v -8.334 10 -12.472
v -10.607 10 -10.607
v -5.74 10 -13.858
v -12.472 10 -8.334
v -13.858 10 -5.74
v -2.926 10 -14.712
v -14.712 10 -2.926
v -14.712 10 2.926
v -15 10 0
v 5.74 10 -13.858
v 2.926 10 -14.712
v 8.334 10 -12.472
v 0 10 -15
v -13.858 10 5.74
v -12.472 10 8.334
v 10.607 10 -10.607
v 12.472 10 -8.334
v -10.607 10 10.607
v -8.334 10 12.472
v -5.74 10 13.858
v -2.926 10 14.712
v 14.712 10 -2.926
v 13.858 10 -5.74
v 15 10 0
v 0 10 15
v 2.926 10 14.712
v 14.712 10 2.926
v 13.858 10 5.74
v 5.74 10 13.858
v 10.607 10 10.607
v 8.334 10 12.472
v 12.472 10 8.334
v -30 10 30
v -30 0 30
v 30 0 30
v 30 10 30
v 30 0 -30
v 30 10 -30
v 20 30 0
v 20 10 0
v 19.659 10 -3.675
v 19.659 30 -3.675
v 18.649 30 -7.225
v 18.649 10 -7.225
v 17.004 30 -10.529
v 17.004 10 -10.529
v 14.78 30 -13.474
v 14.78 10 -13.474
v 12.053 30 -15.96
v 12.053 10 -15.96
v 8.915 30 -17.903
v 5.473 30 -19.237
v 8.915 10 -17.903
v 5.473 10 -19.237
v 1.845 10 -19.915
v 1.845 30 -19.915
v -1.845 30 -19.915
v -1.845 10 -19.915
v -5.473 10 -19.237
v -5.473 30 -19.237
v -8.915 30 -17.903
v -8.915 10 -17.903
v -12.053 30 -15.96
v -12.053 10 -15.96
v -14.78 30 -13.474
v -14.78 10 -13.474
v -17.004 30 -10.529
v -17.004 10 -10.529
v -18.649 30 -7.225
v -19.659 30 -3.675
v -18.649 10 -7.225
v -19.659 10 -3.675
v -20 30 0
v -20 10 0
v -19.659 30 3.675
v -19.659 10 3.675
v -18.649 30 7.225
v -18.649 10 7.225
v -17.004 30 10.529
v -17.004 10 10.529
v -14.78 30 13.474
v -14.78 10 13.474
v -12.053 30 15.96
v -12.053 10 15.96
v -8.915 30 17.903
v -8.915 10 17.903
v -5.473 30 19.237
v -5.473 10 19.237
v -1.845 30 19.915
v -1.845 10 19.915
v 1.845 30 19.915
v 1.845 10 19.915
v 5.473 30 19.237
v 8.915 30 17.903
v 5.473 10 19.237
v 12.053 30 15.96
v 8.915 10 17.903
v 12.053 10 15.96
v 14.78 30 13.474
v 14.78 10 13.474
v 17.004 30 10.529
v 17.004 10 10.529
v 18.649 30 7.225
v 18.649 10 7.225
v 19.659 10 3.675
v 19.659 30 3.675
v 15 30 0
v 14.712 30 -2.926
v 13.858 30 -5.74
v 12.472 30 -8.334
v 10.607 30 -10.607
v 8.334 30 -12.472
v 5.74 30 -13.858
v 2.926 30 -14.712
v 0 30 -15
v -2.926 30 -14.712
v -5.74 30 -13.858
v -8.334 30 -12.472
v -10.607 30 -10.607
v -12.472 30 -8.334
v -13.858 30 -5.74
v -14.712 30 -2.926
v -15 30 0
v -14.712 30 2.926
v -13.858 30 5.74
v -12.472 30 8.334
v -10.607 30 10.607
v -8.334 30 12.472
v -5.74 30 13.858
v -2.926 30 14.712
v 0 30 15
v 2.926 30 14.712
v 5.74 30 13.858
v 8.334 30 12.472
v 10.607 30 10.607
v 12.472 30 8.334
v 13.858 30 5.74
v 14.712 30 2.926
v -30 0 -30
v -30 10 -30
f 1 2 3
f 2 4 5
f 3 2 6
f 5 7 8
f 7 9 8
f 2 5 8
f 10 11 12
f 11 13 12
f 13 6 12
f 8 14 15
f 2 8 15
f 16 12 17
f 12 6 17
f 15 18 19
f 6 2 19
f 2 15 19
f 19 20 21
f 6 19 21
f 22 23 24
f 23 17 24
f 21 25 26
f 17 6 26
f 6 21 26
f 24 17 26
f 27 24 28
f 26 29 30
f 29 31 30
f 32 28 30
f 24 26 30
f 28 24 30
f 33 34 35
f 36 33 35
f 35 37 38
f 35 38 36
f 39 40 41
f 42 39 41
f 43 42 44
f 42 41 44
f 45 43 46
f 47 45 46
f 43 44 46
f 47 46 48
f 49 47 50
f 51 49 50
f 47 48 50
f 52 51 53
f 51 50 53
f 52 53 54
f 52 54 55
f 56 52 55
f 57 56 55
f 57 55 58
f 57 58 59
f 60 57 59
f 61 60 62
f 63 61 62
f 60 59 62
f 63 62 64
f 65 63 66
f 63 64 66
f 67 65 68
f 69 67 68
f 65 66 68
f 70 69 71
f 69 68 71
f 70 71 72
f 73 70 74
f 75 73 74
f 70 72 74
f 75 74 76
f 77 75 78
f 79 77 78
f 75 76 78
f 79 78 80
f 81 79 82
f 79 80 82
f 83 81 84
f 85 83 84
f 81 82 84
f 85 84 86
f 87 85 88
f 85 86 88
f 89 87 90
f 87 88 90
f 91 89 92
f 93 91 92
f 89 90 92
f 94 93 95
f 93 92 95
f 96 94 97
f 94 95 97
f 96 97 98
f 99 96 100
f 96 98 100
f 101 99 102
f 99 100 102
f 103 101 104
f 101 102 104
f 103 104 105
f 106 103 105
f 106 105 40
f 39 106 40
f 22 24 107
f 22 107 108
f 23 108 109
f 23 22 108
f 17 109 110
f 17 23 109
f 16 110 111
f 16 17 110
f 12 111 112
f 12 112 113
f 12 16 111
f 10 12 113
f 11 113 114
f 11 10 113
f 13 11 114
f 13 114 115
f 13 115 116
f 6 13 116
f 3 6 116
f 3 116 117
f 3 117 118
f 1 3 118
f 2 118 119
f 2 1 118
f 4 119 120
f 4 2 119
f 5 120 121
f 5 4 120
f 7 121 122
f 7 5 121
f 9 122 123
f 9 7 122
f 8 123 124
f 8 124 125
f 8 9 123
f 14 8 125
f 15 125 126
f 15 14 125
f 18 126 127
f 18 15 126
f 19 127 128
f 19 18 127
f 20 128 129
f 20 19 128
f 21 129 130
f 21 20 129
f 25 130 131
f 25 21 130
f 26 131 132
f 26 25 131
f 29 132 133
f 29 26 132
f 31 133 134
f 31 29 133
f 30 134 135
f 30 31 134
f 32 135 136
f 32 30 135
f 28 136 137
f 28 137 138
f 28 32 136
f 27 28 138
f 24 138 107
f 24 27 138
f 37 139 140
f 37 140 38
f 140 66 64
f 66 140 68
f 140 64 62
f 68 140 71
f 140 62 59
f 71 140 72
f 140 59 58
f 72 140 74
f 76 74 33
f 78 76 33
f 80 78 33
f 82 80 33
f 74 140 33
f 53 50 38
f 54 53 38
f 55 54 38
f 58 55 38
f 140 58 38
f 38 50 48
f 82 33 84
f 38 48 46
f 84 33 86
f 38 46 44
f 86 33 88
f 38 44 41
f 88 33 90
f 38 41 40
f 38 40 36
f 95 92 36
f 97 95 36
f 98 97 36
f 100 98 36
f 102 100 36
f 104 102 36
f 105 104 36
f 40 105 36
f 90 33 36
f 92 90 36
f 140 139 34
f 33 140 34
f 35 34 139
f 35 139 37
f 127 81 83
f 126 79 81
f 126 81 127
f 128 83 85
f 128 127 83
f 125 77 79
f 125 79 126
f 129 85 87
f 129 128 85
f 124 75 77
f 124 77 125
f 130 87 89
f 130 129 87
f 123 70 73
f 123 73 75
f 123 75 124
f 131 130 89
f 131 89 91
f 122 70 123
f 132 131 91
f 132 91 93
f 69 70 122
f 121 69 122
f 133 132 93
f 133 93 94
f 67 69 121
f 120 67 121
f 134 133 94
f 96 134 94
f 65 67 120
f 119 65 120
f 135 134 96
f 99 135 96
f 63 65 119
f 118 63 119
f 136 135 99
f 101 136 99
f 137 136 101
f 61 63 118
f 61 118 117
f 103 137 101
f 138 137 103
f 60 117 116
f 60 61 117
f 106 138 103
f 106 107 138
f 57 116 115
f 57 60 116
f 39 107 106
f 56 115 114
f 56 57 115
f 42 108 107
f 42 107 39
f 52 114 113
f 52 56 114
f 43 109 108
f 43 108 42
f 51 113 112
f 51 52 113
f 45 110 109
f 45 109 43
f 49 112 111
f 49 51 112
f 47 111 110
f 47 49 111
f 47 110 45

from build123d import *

# Parameters (mm, degrees)
SKETCH_W      = 60
SKETCH_H      = 60
PAD_DEPTH     = 10
SKETCH001_R   = 20
SKETCH001_R_2 = 15
PAD001_DEPTH  = 20


with BuildPart() as part:
    # Sketch → Pad (new body)
    with BuildSketch(Plane.XZ):
        Rectangle(SKETCH_W, SKETCH_H)
    extrude(amount=-PAD_DEPTH)

    # Sketch001 (on Face6 of Pad) → Pad001 (join)
    with BuildSketch(Plane(origin=(0, 10, 0), x_dir=(1, 0, 0), z_dir=(0, 1, 0))):
        Circle(SKETCH001_R)
        Circle(SKETCH001_R_2, mode=Mode.SUBTRACT)
    extrude(amount=PAD001_DEPTH)


solid = part.part
